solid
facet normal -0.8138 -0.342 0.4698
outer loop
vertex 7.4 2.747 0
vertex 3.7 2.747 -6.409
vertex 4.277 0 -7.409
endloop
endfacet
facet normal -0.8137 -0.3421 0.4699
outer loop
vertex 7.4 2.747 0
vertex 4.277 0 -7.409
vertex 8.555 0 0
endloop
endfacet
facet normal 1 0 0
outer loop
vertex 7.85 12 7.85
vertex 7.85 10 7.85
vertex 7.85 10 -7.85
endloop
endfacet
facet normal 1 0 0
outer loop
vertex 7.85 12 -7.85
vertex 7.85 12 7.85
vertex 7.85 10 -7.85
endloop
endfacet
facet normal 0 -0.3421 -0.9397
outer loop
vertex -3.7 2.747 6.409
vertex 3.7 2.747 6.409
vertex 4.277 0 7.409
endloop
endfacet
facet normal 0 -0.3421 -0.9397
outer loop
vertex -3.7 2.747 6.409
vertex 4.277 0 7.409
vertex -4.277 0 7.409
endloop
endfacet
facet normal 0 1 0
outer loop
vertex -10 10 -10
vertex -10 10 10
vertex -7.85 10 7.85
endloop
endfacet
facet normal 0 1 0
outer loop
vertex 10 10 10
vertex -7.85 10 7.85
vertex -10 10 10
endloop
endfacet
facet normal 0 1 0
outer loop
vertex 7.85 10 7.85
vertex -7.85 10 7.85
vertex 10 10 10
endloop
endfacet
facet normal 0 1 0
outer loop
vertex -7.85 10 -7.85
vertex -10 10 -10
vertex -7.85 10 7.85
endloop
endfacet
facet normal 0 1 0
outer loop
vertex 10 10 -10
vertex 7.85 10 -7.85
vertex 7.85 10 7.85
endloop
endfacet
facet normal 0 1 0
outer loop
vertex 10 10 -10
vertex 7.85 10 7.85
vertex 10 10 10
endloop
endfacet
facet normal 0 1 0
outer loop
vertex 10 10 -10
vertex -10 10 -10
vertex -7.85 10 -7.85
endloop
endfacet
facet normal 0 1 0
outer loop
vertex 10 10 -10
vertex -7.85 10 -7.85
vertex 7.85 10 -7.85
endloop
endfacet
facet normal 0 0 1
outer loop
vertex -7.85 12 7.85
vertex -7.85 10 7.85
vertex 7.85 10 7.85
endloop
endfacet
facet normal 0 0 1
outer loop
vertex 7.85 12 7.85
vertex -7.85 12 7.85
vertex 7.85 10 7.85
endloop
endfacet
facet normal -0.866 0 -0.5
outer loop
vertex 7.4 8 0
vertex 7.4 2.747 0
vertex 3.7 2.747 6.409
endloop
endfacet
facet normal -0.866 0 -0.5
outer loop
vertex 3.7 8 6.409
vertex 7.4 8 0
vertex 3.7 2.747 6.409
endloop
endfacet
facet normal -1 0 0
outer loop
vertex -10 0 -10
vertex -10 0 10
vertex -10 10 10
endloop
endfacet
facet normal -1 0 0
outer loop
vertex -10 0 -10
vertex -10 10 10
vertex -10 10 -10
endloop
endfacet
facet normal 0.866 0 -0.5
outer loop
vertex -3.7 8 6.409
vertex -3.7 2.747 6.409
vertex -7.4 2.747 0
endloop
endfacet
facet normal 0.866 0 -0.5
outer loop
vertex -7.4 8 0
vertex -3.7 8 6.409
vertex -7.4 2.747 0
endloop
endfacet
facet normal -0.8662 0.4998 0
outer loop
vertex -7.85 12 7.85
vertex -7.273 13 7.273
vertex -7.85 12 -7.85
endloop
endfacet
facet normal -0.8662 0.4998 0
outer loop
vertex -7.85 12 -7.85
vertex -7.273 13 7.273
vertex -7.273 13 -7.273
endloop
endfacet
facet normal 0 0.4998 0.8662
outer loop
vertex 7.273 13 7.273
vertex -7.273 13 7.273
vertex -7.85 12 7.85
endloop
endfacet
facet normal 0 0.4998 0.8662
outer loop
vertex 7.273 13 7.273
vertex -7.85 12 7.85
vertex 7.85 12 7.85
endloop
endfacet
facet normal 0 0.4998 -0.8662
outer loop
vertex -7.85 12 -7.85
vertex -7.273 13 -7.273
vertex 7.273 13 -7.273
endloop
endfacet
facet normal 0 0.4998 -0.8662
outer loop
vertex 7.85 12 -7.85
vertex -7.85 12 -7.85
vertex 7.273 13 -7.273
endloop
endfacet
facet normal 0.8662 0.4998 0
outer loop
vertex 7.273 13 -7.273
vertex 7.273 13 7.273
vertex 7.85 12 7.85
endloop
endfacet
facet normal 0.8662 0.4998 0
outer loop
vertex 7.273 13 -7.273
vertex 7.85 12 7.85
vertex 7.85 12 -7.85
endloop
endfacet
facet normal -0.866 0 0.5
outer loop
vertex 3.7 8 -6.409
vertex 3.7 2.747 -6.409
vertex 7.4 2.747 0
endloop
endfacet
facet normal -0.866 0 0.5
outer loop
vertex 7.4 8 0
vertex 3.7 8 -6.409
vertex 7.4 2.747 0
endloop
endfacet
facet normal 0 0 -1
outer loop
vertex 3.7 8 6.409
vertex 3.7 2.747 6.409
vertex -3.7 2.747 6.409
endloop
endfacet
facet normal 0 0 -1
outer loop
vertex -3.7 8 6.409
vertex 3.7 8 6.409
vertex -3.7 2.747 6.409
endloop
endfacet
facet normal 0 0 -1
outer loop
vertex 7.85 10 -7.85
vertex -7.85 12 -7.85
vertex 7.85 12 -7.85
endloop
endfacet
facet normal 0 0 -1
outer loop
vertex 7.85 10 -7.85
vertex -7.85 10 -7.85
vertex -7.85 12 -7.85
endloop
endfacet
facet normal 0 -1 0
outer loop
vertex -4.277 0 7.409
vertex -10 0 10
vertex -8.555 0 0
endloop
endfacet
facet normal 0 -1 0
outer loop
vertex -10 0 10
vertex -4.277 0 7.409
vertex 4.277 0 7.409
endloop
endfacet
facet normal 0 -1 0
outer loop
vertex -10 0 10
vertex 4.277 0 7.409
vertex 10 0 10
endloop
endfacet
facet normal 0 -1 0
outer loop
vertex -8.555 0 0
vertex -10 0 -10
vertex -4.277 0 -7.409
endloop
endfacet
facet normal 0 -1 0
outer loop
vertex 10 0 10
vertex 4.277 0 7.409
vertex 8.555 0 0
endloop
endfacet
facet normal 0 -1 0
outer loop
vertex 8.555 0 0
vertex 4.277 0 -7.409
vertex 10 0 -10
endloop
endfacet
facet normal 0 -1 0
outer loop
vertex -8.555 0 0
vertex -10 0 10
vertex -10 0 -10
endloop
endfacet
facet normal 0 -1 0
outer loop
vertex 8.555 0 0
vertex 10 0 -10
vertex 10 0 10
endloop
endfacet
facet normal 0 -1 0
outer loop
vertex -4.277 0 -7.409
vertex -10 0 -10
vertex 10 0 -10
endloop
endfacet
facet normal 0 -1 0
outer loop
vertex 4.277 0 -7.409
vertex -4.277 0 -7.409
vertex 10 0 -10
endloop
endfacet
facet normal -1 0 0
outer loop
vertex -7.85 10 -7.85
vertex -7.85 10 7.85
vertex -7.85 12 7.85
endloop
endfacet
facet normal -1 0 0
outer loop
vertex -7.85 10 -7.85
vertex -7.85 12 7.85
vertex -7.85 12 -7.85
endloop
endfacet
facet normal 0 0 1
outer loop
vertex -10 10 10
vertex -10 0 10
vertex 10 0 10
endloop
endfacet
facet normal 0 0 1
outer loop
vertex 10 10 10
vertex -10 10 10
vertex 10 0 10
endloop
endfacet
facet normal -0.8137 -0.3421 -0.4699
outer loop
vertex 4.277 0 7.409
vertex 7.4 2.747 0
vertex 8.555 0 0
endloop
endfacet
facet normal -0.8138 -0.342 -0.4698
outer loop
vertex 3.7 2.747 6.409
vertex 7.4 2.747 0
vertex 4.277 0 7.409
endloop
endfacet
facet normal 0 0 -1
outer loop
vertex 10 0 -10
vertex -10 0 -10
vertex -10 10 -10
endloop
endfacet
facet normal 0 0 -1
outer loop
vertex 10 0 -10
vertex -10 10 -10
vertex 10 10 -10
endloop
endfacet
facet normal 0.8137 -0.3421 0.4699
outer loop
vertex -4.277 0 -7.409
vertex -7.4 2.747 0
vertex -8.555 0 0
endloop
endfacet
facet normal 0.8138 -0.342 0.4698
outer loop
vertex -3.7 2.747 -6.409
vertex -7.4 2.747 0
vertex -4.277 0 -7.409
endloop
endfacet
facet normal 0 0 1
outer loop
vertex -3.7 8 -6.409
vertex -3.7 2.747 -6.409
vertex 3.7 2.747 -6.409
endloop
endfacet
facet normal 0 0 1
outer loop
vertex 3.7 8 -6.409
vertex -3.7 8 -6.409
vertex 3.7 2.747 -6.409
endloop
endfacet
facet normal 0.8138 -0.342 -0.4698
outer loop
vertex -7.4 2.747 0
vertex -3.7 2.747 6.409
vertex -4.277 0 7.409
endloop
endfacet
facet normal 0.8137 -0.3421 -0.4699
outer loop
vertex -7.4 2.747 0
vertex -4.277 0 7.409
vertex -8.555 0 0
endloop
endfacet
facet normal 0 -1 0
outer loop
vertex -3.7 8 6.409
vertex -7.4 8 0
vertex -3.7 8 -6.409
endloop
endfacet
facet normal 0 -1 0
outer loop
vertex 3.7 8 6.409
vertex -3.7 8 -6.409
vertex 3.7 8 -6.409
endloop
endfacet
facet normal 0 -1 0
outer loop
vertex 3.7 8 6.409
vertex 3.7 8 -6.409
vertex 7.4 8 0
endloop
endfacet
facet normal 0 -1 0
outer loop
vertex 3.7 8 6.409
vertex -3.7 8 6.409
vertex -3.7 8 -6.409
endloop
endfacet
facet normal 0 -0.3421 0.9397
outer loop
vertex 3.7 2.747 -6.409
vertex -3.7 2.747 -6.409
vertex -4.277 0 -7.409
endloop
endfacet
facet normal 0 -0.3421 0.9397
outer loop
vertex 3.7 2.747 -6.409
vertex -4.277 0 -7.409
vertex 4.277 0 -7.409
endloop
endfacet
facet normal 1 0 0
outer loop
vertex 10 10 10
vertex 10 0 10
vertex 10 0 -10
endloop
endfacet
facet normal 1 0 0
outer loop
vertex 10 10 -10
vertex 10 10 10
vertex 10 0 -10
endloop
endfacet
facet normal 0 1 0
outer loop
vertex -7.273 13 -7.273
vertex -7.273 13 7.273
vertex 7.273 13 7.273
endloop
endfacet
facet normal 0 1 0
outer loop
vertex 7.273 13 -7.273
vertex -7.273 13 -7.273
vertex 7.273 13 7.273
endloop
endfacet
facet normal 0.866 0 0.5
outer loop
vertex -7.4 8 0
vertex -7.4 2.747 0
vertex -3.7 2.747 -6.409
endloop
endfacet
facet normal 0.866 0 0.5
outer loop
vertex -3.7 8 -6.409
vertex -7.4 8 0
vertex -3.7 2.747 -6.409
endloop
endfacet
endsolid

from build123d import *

# Parameters (mm, degrees)
SKETCH1_W             = 20
SKETCH1_H             = 20
BOSS_EXTRUDE1_DEPTH   = 10
SKETCH2_W             = 15.7
SKETCH2_H             = 15.7
BOSS_EXTRUDE2_DEPTH   = 3
CHAMFER1_SIZE         = 1
CHAMFER1_SIZE2        = 0.577350269
CHAMFER1_PART_2_SIZE  = 1
CHAMFER1_PART_2_SIZE2 = 0.577350269
CHAMFER1_PART_3_SIZE  = 1
CHAMFER1_PART_3_SIZE2 = 0.577350269
CHAMFER1_PART_4_SIZE  = 1
CHAMFER1_PART_4_SIZE2 = 0.577350269
CUT_EXTRUDE1_DEPTH    = 8
CHAMFER2_SIZE         = 1
CHAMFER2_SIZE2        = 2.747477419


with BuildPart() as part:
    # Sketch1 → Boss-Extrude1 (new body)
    with BuildSketch(Plane(origin=(0, 0, 0), x_dir=(1, 0, 0), z_dir=(0, 1, 0))):
        Rectangle(SKETCH1_W, SKETCH1_H)
    extrude(amount=BOSS_EXTRUDE1_DEPTH)

    # Sketch2 → Boss-Extrude2 (add)
    with BuildSketch(Plane(origin=(0, 10, 0), x_dir=(1, 0, 0), z_dir=(0, 1, 0))):
        Rectangle(SKETCH2_W, SKETCH2_H)
    extrude(amount=BOSS_EXTRUDE2_DEPTH)

    # Chamfer1
    chamfer1_edges = [part.edges().sort_by_distance(p)[0] for p in [
        (-7.85, 13, 0),
    ]]
    chamfer1_side = [part.faces().sort_by_distance(p)[0] for p in [
        (-7.85, 11.5, 0),
    ]]
    chamfer(chamfer1_edges, length=CHAMFER1_SIZE, length2=CHAMFER1_SIZE2, reference=chamfer1_side[0])

    # Chamfer1 part 2
    chamfer1_part_2_edges = [part.edges().sort_by_distance(p)[0] for p in [
        (0, 13, 7.85),
    ]]
    chamfer1_part_2_side = [part.faces().sort_by_distance(p)[0] for p in [
        (0, 11.5, 7.85),
    ]]
    chamfer(chamfer1_part_2_edges, length=CHAMFER1_PART_2_SIZE, length2=CHAMFER1_PART_2_SIZE2, reference=chamfer1_part_2_side[0])

    # Chamfer1 part 3
    chamfer1_part_3_edges = [part.edges().sort_by_distance(p)[0] for p in [
        (7.85, 13, 0),
    ]]
    chamfer1_part_3_side = [part.faces().sort_by_distance(p)[0] for p in [
        (7.85, 11.5, 0),
    ]]
    chamfer(chamfer1_part_3_edges, length=CHAMFER1_PART_3_SIZE, length2=CHAMFER1_PART_3_SIZE2, reference=chamfer1_part_3_side[0])

    # Chamfer1 part 4
    chamfer1_part_4_edges = [part.edges().sort_by_distance(p)[0] for p in [
        (0, 13, -7.85),
    ]]
    chamfer1_part_4_side = [part.faces().sort_by_distance(p)[0] for p in [
        (0, 11.5, -7.85),
    ]]
    chamfer(chamfer1_part_4_edges, length=CHAMFER1_PART_4_SIZE, length2=CHAMFER1_PART_4_SIZE2, reference=chamfer1_part_4_side[0])

    # Sketch3 → Cut-Extrude1 (cut)
    with BuildSketch(Plane.XZ):
        Polygon((-3.7, 6.408587988), (-7.4, 0), (-3.7, -6.408587988), (3.7, -6.408587988), (7.4, 0), (3.7, 6.408587988), align=None)
    extrude(amount=-CUT_EXTRUDE1_DEPTH, mode=Mode.SUBTRACT)

    # Chamfer2
    chamfer2_edges = [part.edges().sort_by_distance(p)[0] for p in [
        (0, 0, 6.408587988),
        (-5.55, 0, 3.204293994),
        (-5.55, 0, -3.204293994),
        (0, 0, -6.408587988),
        (5.55, 0, -3.204293994),
        (5.55, 0, 3.204293994),
    ]]
    chamfer2_side = [part.faces().sort_by_distance(p)[0] for p in [
        (0, 0, 9.717157288),
    ]]
    chamfer(chamfer2_edges, length=CHAMFER2_SIZE, length2=CHAMFER2_SIZE2, reference=chamfer2_side[0])


solid = part.part
